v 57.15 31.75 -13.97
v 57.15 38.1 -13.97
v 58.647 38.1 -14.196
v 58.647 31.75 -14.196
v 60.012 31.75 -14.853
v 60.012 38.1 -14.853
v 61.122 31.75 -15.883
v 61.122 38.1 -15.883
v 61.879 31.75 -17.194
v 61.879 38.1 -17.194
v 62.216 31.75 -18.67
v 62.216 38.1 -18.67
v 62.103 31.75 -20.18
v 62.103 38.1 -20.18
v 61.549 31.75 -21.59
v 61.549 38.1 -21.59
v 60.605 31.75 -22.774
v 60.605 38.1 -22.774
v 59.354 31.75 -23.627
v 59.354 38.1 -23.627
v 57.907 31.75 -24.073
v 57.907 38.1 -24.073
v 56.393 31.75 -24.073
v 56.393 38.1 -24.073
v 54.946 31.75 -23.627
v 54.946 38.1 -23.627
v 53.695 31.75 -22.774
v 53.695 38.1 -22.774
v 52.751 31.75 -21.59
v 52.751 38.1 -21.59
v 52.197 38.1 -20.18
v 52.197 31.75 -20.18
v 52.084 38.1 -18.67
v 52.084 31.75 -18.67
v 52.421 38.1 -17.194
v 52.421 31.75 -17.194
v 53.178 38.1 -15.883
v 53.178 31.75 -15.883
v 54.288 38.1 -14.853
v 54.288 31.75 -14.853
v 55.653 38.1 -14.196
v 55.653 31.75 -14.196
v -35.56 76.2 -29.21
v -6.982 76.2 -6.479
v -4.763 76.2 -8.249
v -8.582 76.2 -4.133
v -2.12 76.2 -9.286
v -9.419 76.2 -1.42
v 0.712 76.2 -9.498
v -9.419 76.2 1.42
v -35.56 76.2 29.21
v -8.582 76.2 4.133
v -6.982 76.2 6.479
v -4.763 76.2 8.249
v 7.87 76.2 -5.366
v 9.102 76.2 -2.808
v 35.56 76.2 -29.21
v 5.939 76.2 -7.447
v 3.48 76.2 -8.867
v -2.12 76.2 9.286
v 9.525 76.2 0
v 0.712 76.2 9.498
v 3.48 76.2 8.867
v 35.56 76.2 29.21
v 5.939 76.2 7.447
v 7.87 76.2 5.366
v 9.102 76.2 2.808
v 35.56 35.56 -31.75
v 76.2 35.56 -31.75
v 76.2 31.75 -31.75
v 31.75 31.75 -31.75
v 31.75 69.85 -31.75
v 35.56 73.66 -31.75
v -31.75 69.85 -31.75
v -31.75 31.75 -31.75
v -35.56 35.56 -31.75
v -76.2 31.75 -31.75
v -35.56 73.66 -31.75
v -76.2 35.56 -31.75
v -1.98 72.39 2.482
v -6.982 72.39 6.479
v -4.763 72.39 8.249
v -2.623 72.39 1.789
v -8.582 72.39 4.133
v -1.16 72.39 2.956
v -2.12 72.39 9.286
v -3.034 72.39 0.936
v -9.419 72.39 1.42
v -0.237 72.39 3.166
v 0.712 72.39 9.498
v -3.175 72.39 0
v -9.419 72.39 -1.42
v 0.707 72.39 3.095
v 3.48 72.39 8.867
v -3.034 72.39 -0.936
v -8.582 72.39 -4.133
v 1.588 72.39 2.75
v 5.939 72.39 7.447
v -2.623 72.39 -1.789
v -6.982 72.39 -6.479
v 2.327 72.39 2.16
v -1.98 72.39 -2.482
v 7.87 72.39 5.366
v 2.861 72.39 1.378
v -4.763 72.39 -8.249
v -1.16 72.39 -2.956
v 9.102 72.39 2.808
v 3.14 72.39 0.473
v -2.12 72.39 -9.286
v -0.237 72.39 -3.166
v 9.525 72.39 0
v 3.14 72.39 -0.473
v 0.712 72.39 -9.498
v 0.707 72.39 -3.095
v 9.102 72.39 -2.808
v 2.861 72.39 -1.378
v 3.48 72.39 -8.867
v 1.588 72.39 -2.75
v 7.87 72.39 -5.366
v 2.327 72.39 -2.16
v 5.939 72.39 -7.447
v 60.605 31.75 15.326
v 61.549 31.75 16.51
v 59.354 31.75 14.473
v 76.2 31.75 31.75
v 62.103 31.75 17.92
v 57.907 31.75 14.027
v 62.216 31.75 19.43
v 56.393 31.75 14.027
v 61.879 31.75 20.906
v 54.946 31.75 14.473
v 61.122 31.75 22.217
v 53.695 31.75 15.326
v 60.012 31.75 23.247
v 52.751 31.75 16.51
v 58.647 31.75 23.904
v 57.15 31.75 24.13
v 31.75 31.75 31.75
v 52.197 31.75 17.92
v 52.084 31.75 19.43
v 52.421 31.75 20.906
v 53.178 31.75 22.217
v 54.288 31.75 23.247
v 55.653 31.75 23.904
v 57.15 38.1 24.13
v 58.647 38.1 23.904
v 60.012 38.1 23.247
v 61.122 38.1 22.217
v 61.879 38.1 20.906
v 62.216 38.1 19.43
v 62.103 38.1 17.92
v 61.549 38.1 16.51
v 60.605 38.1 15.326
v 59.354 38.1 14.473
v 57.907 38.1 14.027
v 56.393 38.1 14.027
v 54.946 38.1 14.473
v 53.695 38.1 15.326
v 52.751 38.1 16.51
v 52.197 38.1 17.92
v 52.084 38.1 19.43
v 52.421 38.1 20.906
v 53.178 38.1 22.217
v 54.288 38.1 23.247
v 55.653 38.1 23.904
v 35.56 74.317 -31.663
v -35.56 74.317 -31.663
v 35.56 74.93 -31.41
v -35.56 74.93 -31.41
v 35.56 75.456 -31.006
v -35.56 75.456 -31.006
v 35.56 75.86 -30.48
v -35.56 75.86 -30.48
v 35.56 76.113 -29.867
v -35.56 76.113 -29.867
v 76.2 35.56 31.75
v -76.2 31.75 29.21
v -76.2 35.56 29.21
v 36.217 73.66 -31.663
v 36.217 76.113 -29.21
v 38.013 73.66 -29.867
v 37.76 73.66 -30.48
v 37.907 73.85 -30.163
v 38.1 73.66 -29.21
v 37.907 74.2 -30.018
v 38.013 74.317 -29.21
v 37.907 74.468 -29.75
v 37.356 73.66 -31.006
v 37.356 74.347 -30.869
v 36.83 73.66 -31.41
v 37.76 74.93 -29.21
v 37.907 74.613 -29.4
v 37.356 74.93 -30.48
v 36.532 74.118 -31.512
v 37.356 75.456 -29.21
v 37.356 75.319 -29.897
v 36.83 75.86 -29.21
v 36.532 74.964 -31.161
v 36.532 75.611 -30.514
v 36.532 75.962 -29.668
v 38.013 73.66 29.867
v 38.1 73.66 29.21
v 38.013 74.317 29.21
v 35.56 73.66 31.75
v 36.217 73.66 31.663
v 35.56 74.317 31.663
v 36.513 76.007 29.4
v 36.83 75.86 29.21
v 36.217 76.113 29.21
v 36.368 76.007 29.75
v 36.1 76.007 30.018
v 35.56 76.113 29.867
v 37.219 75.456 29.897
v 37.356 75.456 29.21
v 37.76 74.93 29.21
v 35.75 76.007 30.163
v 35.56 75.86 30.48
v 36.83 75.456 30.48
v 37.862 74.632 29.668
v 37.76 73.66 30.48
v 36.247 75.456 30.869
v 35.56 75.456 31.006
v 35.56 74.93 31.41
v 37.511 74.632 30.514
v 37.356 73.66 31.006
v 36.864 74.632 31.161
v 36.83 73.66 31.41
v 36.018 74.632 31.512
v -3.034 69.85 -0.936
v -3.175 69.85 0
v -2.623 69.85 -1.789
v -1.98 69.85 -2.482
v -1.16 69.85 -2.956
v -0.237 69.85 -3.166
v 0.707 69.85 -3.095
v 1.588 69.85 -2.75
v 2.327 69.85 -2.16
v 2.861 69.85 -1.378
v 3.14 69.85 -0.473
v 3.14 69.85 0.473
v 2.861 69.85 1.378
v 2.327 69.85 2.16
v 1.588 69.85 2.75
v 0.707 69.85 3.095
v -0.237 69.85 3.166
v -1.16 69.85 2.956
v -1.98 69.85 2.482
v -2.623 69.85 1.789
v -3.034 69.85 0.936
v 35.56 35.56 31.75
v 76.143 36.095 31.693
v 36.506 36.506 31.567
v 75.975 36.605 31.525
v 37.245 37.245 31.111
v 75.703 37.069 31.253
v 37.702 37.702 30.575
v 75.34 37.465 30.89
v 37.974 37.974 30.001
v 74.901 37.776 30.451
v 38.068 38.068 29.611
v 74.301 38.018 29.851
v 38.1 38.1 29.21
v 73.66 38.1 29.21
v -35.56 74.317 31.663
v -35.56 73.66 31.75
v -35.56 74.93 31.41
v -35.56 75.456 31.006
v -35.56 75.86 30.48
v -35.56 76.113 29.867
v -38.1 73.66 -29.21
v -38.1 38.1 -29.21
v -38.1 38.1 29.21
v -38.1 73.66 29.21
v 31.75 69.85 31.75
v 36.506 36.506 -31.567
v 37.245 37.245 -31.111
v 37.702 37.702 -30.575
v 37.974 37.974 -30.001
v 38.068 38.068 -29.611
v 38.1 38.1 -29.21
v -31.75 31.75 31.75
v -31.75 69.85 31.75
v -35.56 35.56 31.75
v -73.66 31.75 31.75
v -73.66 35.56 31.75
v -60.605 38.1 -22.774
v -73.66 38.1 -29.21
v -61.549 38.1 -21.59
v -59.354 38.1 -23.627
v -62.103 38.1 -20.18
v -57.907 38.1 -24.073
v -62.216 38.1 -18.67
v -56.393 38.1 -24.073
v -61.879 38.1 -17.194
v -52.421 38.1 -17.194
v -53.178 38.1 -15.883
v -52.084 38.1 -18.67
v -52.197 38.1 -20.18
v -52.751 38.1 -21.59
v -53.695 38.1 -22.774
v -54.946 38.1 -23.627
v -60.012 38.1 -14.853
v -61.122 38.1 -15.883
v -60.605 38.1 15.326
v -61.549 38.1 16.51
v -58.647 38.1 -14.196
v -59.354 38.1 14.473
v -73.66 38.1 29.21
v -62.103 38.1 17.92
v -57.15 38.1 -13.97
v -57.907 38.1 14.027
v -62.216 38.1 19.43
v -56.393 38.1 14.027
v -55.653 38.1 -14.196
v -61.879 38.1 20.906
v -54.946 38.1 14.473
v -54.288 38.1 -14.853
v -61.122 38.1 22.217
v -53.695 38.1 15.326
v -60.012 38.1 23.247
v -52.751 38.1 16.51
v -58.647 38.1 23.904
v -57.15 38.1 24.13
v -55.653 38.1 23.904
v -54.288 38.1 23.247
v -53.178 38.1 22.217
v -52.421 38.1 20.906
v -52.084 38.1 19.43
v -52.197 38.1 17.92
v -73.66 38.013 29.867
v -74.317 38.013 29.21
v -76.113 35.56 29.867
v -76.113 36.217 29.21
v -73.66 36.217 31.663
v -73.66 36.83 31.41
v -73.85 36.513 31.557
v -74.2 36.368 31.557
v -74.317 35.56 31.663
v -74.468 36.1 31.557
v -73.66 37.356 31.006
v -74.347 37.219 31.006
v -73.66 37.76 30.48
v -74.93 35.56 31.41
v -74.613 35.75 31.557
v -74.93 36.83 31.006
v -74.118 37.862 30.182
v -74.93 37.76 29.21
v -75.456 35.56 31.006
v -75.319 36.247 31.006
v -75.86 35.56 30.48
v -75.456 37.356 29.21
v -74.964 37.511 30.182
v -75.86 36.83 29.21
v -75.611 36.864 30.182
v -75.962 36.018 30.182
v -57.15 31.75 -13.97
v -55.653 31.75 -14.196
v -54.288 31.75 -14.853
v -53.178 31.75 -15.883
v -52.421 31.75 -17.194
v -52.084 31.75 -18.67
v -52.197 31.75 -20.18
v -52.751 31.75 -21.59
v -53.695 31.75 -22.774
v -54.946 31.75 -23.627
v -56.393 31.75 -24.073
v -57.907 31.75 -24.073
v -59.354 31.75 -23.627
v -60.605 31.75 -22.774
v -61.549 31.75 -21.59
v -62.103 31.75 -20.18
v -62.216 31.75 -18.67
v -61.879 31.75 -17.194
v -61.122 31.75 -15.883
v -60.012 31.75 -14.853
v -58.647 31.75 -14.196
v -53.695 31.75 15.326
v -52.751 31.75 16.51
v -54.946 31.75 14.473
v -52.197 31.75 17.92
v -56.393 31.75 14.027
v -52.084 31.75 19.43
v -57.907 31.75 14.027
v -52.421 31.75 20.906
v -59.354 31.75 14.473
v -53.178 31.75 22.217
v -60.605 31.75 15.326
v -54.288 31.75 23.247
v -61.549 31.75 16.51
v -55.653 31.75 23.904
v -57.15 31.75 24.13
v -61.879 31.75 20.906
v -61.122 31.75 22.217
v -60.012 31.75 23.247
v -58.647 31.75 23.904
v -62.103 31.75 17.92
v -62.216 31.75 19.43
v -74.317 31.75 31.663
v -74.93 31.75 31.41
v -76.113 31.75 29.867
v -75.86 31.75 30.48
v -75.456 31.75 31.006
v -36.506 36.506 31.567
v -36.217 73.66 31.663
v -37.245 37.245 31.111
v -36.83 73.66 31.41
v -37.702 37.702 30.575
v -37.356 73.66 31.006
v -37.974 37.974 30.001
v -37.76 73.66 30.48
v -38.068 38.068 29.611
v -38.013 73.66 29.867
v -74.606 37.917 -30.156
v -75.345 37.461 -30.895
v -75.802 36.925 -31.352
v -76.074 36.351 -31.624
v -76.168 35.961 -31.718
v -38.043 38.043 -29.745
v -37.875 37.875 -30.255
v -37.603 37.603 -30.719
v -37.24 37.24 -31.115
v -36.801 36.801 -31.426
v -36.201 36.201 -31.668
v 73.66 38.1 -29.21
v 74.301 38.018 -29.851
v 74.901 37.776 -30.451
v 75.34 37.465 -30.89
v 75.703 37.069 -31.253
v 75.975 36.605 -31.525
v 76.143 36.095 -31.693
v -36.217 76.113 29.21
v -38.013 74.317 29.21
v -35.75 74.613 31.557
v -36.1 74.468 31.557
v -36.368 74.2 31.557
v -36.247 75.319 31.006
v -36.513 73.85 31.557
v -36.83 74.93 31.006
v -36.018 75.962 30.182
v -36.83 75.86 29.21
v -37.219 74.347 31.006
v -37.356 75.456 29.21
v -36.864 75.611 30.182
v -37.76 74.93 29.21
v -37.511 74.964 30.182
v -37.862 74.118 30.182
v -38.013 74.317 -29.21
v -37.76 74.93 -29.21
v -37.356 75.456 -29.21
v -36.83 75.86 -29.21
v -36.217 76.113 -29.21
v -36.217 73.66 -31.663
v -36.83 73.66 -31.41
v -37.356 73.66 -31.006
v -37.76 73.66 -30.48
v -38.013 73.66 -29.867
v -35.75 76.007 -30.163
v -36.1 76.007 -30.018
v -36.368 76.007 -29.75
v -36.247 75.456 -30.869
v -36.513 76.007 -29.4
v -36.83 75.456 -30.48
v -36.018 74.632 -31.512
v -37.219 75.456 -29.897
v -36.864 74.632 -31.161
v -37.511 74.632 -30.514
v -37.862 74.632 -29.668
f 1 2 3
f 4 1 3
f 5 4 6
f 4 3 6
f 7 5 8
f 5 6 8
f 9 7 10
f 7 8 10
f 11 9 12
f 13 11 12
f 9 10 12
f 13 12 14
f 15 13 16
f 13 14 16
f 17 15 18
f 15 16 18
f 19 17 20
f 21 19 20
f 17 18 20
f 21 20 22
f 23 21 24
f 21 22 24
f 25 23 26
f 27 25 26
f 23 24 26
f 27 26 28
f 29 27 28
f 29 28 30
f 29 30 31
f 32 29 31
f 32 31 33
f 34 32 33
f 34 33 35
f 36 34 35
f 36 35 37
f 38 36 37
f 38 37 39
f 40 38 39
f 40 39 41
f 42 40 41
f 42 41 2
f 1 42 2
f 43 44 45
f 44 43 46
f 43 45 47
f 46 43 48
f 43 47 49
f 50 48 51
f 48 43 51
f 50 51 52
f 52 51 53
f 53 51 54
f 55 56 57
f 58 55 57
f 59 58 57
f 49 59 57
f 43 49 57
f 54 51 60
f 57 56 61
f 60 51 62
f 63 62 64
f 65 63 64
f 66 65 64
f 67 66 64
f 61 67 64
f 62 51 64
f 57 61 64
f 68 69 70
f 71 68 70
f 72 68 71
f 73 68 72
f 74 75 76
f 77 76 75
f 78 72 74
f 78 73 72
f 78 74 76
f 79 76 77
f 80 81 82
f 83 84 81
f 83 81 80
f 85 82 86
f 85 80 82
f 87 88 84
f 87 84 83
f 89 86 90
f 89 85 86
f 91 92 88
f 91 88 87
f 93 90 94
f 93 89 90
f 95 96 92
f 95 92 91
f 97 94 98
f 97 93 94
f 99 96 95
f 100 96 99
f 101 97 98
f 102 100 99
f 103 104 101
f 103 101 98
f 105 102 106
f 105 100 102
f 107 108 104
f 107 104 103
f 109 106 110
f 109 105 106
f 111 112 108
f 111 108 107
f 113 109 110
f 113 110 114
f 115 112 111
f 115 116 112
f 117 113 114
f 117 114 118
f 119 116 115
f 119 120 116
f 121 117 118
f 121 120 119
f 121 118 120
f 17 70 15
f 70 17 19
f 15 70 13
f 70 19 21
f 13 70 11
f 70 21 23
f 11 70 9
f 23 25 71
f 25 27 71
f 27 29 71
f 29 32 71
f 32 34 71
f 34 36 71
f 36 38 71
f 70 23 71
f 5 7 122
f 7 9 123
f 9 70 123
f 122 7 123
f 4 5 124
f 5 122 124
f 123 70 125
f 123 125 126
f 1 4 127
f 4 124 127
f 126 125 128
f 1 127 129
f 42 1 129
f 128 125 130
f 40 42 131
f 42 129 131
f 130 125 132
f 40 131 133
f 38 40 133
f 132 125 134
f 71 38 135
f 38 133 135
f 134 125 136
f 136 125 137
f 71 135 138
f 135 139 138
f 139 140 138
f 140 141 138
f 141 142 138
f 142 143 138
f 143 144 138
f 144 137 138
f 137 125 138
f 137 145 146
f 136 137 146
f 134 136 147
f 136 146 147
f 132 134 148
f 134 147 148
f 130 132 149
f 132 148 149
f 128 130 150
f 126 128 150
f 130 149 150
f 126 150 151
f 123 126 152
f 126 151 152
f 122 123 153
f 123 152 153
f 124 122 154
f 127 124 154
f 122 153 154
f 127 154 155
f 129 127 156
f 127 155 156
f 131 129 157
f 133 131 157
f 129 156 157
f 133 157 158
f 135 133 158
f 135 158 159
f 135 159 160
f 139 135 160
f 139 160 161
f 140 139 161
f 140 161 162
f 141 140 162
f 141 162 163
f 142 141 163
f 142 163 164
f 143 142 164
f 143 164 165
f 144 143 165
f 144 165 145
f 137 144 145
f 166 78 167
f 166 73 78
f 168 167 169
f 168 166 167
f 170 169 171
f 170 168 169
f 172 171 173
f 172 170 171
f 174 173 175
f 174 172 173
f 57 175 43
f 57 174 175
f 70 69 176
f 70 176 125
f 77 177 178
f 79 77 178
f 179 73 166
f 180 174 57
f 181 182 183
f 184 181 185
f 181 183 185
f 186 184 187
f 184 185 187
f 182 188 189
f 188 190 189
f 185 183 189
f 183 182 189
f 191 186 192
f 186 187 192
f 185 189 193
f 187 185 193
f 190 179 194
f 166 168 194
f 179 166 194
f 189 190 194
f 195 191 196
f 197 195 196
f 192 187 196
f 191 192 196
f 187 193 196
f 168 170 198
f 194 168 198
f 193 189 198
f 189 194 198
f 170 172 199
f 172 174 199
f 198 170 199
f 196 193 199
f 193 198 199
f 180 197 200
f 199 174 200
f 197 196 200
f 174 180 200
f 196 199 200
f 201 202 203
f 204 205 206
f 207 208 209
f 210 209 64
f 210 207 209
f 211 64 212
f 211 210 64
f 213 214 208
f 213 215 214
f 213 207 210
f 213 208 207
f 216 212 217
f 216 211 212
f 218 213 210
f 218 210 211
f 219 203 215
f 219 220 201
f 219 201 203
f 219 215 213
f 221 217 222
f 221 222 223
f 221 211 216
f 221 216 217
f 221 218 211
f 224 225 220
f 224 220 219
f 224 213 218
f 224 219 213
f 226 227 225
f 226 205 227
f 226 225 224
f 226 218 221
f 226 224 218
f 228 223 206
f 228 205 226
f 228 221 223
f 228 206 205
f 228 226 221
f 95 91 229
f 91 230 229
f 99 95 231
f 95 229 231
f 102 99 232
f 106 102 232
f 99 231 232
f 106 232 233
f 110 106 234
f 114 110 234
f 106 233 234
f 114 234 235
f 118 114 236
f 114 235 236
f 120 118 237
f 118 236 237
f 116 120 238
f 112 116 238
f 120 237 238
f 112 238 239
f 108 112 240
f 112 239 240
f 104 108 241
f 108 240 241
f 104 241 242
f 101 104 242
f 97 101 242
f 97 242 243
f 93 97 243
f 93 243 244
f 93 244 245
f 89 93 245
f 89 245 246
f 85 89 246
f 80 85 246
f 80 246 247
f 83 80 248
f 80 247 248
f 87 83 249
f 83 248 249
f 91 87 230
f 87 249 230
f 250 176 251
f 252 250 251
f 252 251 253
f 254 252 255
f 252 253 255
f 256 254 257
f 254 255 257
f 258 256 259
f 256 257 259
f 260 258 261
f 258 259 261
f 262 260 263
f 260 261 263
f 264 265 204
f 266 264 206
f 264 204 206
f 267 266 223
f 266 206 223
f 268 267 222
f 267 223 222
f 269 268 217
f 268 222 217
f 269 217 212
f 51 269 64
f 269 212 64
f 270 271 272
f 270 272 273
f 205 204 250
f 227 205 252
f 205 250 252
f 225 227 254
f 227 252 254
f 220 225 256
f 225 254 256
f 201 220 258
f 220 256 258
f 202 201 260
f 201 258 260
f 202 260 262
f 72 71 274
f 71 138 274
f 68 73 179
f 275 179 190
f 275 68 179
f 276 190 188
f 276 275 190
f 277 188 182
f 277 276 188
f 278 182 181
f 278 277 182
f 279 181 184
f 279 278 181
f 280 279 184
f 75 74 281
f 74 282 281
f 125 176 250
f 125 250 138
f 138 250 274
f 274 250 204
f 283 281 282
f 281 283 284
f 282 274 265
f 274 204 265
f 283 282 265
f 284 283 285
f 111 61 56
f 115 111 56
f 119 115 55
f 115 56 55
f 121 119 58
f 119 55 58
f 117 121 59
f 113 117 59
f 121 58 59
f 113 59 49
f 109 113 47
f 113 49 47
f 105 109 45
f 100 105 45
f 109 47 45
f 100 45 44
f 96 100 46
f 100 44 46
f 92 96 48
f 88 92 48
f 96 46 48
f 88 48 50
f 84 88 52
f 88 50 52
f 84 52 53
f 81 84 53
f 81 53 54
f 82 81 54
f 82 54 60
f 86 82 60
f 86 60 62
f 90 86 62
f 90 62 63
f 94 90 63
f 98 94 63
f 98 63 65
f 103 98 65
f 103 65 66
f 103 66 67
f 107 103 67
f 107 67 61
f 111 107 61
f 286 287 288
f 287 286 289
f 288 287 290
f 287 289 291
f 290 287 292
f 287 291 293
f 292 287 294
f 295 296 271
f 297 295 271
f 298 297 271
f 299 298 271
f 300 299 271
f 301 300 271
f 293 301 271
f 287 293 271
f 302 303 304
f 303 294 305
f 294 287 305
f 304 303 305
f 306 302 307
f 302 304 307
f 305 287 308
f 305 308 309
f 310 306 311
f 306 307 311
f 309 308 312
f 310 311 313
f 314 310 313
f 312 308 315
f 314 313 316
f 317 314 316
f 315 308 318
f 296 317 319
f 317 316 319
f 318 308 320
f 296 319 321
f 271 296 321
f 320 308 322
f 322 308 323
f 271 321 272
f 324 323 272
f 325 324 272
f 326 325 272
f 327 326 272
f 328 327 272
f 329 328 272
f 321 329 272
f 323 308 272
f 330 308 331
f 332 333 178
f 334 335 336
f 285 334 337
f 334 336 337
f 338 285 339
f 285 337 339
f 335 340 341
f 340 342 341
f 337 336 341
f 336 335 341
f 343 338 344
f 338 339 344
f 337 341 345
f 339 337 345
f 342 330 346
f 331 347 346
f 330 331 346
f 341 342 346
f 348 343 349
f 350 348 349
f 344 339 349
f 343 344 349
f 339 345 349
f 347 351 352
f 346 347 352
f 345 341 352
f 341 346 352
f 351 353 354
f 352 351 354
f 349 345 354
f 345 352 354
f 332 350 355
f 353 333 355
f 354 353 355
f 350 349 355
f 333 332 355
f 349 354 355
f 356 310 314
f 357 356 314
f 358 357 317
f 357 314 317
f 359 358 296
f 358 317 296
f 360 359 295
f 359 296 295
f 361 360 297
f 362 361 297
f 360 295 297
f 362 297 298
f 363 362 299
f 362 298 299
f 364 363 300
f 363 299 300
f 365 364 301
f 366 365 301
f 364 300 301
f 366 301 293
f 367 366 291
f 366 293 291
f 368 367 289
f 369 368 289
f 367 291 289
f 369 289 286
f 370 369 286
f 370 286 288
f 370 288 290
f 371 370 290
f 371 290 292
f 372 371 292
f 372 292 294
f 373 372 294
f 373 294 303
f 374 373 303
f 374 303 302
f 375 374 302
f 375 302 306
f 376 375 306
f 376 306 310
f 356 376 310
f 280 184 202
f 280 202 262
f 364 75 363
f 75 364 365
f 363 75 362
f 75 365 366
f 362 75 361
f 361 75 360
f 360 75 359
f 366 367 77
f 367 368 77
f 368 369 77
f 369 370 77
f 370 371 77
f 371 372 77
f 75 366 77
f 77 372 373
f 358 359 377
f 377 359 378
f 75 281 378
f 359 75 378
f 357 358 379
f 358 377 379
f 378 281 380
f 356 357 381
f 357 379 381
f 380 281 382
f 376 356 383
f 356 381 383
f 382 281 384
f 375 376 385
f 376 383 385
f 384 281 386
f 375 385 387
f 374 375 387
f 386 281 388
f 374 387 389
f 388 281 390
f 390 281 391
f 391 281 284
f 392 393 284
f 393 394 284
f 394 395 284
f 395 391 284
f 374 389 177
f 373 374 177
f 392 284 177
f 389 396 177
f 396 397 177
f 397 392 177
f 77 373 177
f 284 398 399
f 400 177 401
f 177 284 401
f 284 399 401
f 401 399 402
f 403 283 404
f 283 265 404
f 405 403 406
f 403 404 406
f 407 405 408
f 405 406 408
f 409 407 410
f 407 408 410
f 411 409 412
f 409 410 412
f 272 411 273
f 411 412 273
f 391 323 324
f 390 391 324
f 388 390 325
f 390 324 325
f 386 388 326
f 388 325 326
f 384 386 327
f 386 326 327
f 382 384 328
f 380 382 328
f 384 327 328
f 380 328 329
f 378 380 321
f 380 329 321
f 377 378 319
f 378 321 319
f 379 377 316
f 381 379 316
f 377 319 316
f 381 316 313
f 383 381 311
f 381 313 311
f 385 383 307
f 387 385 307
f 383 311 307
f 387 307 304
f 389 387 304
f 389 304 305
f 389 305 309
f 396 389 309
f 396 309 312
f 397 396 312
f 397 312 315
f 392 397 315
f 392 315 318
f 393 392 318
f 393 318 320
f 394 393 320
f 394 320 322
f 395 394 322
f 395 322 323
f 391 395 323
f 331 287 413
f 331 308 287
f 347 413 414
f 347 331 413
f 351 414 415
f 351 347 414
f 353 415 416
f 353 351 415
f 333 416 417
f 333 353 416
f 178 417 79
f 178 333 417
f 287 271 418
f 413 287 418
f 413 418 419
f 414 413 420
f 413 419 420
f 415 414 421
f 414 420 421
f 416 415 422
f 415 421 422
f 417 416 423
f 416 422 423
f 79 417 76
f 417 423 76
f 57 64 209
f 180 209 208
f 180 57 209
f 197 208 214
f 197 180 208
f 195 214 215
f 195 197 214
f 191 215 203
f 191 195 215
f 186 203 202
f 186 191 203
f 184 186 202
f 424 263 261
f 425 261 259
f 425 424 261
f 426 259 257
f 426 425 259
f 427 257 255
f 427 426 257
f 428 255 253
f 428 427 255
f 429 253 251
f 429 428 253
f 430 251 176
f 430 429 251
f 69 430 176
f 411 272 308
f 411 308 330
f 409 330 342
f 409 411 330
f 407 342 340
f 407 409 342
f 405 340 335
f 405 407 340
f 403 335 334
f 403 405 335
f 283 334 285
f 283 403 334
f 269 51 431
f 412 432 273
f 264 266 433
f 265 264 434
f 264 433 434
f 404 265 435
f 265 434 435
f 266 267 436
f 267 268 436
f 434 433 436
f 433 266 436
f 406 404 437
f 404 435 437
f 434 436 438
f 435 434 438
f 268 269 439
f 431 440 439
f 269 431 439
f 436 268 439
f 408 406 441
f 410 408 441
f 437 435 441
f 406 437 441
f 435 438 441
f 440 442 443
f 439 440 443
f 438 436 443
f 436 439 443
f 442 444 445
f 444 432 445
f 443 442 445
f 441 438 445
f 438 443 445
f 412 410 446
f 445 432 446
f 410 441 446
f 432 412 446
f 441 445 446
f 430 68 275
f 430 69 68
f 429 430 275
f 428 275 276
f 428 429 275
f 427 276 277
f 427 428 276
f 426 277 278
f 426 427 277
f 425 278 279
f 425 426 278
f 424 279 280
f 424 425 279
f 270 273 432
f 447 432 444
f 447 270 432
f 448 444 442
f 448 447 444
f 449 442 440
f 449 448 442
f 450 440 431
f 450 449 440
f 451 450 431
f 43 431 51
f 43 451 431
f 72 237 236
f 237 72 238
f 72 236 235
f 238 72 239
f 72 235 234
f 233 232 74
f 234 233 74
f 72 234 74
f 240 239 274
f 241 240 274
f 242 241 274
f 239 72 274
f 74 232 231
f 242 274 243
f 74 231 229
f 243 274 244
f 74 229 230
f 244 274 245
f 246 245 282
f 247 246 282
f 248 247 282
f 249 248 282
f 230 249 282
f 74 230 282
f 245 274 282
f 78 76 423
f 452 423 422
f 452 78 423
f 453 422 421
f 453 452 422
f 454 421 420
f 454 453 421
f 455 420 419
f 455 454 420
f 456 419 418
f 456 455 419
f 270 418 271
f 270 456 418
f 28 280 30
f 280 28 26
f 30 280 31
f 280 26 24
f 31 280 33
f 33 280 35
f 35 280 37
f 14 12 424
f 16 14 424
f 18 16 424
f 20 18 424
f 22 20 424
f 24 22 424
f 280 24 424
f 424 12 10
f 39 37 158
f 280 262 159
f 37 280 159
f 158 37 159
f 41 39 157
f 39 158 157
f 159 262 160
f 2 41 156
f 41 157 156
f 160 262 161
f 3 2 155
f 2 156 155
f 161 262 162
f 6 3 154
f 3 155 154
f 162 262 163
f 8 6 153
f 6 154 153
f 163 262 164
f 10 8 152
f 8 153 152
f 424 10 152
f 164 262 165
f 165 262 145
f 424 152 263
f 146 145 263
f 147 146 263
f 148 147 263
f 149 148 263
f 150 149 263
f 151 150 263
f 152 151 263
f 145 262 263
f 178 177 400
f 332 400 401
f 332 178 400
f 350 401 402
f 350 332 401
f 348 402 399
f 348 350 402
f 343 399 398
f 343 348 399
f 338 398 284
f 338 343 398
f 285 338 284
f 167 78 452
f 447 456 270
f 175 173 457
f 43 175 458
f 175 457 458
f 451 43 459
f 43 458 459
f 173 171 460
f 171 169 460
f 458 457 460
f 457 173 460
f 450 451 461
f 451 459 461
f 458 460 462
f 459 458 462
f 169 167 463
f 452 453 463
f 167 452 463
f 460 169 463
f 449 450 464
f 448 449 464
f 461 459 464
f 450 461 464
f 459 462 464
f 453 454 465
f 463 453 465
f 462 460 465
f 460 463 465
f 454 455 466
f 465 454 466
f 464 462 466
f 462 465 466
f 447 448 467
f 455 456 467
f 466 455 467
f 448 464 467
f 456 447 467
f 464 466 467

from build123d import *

# Parameters (mm, degrees)
EXTRUDE_THIN2_DEPTH                                 = 31.75
CBORE_FOR_00_BINDING_HEAD_MACHINE_SCREW_D           = 6.35
CBORE_FOR_00_BINDING_HEAD_MACHINE_SCREW_CBORE_D     = 19.05
CBORE_FOR_00_BINDING_HEAD_MACHINE_SCREW_CBORE_DEPTH = 3.81
SKETCH14_R                                          = 5.08
CUT_EXTRUDE1_DEPTH                                  = 91.918163752
LPATTERN1_COUNT                                     = 2
LPATTERN1_PITCH                                     = 38.1
LPATTERN1_COUNT_DIR2                                = 2
LPATTERN1_PITCH_DIR2                                = 114.3
FILLET1_R                                           = 2.54


with BuildPart() as part:
    # Sketch3 → Extrude-Thin2 (new, symmetric)
    with BuildSketch(Plane.XY):
        Polygon((-76.2, 38.1), (-38.1, 38.1), (-38.1, 76.2), (38.1, 76.2), (38.1, 38.1), (76.2, 38.1), (76.2, 31.75), (31.75, 31.75), (31.75, 69.85), (-31.75, 69.85), (-31.75, 31.75), (-76.2, 31.75), align=None)
    extrude(amount=EXTRUDE_THIN2_DEPTH, both=True)

    # CBORE for #00 Binding Head Machine Screw1 (through all)
    with Locations(Plane(origin=(0, 76.2, 0), x_dir=(1, 0, 0), z_dir=(0, 1, 0))):
        with Locations((0, 0)):
            CounterBoreHole(CBORE_FOR_00_BINDING_HEAD_MACHINE_SCREW_D / 2, CBORE_FOR_00_BINDING_HEAD_MACHINE_SCREW_CBORE_D / 2, CBORE_FOR_00_BINDING_HEAD_MACHINE_SCREW_CBORE_DEPTH)

    # Sketch14 → Cut-Extrude1 (cut, through all)
    with BuildSketch(Plane(origin=(0, 38.1, 0), x_dir=(1, 0, 0), z_dir=(0, 1, 0))):
        with Locations(Location((-57.15, -19.05, 0), (0, 0, 270))):
            Circle(SKETCH14_R)
    cut_extrude1 = extrude(amount=-CUT_EXTRUDE1_DEPTH, mode=Mode.SUBTRACT)

    # LPattern1: Cut-Extrude1 2 × 2
    with Locations(*[(j * LPATTERN1_PITCH_DIR2, 0, -i * LPATTERN1_PITCH) for i in range(LPATTERN1_COUNT) for j in range(LPATTERN1_COUNT_DIR2) if (i, j) != (0, 0)]):
        add(cut_extrude1, mode=Mode.SUBTRACT)

    # Fillet1
    fillet1_edges = [part.edges().sort_by_distance(p)[0] for p in [
        (-57.15, 38.1, -31.75),
        (-38.1, 57.15, -31.75),
        (0, 76.2, -31.75),
        (57.15, 38.1, 31.75),
        (38.1, 57.15, -31.75),
        (57.15, 38.1, -31.75),
        (38.1, 57.15, 31.75),
        (-76.2, 38.1, 0),
        (-38.1, 76.2, 0),
        (38.1, 76.2, 0),
        (76.2, 38.1, 0),
        (0, 76.2, 31.75),
        (-38.1, 57.15, 31.75),
        (-57.15, 38.1, 31.75),
        (-76.2, 34.925, 31.75),
    ]]
    fillet(fillet1_edges, radius=FILLET1_R)


solid = part.part
